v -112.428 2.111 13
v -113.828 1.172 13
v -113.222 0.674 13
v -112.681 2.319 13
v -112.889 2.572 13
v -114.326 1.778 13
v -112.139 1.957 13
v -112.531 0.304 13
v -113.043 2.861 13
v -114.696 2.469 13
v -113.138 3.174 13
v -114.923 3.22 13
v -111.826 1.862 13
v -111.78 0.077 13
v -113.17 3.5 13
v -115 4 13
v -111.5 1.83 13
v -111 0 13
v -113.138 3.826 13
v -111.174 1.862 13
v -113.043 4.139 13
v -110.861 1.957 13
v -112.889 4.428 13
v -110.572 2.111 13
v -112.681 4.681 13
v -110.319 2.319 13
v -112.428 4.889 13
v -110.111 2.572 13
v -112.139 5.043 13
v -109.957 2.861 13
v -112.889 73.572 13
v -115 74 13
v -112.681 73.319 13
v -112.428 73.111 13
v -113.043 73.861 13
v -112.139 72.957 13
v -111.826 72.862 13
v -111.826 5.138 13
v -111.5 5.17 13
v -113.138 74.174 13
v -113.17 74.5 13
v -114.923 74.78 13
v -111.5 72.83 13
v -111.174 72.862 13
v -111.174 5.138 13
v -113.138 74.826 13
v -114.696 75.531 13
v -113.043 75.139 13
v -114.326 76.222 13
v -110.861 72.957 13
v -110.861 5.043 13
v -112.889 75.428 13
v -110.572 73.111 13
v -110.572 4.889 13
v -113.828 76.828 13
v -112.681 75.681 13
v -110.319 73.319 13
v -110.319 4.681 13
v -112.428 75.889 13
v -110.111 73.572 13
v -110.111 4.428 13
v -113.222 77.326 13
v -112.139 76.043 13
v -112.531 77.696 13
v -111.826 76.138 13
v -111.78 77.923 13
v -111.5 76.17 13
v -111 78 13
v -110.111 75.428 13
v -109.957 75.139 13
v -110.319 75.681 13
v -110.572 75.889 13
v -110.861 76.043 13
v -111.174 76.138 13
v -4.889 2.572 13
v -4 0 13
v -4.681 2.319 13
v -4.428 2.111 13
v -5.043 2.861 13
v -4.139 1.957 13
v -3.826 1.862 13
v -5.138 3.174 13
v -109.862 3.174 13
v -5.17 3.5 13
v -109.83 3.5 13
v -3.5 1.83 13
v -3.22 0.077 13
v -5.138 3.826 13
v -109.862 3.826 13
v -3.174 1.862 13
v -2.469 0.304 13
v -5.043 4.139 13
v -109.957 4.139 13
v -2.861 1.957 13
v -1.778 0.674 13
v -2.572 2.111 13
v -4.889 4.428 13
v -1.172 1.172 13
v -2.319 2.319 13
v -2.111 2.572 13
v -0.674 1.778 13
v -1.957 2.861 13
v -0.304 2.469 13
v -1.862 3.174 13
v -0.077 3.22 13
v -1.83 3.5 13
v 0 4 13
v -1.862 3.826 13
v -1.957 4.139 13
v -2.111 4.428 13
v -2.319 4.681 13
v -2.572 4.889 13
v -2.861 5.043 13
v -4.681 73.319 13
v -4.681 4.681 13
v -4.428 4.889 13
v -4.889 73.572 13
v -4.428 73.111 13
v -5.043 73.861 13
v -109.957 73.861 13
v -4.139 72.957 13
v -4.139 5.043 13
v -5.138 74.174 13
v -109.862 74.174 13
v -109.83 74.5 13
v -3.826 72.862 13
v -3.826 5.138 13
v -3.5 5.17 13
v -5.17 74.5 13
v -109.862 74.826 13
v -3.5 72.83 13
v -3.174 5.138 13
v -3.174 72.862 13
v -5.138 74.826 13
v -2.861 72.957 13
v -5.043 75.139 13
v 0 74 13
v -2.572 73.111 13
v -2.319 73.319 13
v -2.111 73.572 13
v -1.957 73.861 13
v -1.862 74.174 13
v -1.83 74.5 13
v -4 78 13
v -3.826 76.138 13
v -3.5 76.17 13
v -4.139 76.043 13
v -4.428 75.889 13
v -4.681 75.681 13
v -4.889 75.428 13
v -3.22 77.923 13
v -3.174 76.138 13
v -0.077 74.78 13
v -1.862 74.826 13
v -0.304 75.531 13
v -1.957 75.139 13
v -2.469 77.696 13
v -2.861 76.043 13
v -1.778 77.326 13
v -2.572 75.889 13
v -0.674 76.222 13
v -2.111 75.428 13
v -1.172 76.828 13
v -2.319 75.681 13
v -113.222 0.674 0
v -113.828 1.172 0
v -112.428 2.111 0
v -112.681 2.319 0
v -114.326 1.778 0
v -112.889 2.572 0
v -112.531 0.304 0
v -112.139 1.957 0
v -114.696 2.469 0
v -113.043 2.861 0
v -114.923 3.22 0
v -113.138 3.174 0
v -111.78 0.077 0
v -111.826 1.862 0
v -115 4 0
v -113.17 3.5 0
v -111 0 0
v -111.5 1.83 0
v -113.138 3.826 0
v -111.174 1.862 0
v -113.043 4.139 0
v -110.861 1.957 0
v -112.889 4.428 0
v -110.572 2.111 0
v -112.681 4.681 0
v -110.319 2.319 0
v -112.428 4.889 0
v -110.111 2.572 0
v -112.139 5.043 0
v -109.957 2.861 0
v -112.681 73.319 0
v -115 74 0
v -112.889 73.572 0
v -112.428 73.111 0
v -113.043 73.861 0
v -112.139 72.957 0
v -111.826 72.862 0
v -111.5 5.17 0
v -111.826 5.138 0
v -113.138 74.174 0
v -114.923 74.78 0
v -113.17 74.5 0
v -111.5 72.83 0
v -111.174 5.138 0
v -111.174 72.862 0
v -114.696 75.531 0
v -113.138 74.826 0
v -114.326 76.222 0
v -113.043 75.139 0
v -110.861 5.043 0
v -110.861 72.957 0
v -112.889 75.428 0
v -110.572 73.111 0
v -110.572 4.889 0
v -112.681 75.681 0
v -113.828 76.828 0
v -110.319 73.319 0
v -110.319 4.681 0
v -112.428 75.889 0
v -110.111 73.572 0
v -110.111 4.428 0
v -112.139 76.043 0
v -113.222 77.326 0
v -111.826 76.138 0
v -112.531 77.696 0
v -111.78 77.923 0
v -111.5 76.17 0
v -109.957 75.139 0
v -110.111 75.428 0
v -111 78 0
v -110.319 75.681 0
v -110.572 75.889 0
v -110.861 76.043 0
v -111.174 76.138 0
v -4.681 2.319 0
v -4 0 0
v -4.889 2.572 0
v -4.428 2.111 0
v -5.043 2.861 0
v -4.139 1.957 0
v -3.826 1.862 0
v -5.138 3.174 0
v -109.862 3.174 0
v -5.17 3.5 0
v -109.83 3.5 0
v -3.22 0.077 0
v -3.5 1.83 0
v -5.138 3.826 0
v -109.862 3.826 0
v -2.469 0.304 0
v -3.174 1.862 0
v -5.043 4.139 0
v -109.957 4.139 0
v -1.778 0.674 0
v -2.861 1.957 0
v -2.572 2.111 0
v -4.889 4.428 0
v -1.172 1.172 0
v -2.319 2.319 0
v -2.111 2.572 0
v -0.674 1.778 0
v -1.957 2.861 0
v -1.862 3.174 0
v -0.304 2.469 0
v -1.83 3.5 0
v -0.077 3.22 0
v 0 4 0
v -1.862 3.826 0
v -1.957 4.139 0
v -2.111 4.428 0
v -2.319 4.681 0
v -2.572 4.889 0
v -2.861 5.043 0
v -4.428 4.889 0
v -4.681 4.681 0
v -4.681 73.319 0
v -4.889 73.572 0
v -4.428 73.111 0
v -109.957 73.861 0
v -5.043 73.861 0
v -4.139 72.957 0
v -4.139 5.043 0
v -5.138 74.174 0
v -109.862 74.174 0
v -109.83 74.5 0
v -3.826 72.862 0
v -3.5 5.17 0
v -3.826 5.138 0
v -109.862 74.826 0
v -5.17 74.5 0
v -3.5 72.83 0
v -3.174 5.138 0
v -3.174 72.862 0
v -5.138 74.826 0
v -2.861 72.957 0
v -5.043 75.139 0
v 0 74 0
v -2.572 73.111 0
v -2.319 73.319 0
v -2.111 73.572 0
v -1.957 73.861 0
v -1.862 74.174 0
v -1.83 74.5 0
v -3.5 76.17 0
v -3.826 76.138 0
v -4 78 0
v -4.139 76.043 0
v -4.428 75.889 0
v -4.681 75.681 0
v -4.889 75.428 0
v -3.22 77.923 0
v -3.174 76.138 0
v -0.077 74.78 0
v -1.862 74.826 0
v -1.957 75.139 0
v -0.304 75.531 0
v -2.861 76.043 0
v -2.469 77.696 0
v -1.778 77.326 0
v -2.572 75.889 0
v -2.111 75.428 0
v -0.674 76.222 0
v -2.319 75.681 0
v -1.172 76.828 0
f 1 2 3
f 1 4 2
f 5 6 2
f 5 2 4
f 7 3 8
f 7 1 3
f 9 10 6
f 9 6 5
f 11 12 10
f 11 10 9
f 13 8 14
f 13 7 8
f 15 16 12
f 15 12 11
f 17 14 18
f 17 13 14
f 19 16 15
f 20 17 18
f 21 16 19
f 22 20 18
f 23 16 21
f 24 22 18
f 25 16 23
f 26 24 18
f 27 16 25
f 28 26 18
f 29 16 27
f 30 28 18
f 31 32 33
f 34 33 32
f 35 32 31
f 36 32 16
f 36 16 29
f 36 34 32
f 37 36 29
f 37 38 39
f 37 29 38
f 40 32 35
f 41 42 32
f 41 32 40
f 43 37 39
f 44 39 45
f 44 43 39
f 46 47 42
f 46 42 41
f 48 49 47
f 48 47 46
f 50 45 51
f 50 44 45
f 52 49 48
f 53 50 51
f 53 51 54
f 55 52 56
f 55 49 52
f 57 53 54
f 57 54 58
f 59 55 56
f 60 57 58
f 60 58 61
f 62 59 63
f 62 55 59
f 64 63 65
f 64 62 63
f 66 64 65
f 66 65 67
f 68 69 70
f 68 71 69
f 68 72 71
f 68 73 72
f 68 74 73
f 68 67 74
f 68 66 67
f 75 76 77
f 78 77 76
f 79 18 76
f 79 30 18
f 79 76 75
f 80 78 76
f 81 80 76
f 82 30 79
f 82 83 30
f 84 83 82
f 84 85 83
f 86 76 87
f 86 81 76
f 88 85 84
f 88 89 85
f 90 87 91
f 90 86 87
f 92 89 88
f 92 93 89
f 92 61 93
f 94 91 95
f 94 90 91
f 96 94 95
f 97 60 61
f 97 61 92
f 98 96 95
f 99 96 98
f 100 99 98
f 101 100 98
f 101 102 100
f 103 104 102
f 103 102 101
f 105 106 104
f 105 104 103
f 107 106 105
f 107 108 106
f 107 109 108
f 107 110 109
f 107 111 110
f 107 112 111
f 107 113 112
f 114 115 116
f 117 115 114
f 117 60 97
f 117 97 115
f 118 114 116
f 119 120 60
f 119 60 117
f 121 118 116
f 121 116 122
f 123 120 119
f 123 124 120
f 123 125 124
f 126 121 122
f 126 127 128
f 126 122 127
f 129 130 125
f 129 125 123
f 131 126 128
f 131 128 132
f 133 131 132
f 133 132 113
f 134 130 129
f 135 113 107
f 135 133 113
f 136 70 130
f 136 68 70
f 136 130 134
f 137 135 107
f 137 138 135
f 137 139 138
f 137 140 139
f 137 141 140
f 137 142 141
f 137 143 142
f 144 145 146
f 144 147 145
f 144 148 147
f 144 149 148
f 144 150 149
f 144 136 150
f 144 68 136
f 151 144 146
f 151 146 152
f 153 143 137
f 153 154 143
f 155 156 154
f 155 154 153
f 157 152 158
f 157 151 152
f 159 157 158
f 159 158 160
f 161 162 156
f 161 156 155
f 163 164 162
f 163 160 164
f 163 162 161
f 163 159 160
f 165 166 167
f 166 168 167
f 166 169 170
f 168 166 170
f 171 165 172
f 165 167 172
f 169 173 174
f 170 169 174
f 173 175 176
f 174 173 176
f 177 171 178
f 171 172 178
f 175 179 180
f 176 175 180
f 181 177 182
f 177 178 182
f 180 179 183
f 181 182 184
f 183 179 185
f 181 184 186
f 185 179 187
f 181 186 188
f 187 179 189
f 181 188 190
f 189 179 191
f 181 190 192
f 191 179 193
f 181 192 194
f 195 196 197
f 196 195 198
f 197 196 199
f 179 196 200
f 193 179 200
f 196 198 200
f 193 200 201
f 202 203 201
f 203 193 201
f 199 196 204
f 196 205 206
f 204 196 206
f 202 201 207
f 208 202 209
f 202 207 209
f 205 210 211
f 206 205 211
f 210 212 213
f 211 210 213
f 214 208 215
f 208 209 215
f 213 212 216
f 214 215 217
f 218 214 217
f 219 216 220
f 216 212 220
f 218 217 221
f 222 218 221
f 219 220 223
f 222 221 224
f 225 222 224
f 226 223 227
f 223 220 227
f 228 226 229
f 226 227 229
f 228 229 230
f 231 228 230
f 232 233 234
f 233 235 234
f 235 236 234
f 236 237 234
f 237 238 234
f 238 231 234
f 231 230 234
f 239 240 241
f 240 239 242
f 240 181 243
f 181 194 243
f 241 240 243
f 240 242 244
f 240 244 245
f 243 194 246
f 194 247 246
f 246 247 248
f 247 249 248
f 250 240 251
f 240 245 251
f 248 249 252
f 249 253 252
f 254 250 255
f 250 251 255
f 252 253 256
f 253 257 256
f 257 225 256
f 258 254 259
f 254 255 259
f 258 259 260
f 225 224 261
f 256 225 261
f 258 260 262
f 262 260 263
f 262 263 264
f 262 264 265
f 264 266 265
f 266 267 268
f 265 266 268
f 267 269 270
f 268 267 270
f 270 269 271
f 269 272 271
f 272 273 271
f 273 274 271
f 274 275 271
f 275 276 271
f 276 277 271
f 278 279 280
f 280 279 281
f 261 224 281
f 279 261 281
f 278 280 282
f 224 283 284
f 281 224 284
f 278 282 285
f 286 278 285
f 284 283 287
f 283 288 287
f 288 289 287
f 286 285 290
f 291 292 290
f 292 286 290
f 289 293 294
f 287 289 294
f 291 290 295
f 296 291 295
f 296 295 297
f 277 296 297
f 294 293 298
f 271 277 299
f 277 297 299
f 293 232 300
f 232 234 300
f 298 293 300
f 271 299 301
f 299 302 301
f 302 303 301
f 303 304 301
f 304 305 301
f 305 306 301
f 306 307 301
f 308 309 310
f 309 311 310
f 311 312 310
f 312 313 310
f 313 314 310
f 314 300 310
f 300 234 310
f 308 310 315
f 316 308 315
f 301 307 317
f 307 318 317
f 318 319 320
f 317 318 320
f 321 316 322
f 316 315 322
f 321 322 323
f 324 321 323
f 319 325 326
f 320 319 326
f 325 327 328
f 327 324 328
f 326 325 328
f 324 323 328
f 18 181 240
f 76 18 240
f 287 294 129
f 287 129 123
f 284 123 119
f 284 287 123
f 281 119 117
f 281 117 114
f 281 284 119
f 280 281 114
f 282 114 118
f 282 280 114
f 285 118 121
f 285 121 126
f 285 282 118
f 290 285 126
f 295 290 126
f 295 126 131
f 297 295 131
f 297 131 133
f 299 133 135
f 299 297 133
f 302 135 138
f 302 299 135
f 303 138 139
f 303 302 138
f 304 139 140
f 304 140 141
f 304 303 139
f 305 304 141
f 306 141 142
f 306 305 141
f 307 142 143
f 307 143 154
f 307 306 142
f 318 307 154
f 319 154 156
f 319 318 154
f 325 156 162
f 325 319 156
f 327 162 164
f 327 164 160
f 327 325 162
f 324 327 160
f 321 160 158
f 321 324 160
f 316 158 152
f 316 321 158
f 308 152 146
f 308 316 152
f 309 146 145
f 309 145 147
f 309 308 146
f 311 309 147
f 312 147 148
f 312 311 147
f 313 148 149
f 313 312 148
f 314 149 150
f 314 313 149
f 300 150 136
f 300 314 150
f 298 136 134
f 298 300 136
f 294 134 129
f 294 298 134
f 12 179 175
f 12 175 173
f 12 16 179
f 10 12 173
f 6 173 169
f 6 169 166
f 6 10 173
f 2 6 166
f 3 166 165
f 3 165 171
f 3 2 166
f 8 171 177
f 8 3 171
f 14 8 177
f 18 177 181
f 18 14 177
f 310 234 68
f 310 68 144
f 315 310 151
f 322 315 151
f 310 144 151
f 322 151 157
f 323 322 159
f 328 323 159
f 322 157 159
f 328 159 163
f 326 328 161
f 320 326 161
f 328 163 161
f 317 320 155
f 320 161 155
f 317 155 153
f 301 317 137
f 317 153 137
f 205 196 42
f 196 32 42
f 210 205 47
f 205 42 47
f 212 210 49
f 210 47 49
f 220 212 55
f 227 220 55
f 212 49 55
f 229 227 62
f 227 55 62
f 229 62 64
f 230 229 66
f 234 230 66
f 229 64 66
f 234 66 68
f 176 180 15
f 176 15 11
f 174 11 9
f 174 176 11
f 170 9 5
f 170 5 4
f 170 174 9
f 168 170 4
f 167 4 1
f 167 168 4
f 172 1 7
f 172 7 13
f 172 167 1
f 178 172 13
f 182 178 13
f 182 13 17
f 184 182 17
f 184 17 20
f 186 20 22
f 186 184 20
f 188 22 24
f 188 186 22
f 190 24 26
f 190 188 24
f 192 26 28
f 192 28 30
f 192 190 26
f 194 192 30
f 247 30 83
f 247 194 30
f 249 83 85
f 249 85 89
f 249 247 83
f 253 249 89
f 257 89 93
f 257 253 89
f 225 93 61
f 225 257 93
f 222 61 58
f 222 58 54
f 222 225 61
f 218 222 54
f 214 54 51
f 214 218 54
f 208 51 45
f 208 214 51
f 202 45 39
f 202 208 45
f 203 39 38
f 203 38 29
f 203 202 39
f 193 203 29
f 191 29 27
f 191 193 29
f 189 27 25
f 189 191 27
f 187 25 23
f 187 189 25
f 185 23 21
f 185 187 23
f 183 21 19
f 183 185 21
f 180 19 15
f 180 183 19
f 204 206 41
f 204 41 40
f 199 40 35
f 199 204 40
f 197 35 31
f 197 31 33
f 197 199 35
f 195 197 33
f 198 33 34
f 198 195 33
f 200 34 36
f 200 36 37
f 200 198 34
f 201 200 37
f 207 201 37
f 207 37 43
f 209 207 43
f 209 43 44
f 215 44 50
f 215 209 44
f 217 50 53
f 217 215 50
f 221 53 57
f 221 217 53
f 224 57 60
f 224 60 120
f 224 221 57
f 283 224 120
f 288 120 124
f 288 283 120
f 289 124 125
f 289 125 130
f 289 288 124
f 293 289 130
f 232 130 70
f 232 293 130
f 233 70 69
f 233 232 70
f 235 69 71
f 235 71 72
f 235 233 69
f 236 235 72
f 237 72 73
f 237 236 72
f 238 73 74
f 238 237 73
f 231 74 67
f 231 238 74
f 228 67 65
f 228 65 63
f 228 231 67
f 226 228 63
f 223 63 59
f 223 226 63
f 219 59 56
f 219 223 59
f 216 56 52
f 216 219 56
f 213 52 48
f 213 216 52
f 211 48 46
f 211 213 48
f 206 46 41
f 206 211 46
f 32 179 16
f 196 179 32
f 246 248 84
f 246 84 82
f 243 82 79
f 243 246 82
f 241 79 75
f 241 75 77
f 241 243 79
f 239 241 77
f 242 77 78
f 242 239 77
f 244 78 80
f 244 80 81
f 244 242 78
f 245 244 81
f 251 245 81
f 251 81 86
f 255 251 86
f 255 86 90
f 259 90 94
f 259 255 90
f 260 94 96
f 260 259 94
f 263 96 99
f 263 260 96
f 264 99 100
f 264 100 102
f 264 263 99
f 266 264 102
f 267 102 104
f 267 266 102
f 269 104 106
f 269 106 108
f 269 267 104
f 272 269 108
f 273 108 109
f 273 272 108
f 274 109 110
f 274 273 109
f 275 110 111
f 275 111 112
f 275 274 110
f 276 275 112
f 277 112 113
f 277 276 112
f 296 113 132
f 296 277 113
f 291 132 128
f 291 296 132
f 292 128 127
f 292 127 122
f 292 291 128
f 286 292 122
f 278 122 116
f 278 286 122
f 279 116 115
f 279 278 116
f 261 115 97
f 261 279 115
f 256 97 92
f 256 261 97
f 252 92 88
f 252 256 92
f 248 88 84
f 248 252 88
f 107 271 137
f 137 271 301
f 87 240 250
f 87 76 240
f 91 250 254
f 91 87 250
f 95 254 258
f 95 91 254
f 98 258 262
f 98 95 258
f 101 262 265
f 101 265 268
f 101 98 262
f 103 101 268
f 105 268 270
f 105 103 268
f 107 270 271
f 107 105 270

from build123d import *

# Parameters (mm, degrees)
SKETCH1_W           = 115
SKETCH1_H           = 78
SKETCH1_R           = 1.67
BOSS_EXTRUDE1_DEPTH = 13
FILLET1_R           = 4


with BuildPart() as part:
    # Sketch1 → Boss-Extrude1 (new body)
    with BuildSketch(Plane.XY):
        with Locations((-57.5, 39)):
            Rectangle(SKETCH1_W, SKETCH1_H)
        with Locations(Location((-111.5, 74.5, 0), (0, 0, 180))):
            Circle(SKETCH1_R, mode=Mode.SUBTRACT)
        with Locations(Location((-3.5, 74.5, 0), (0, 0, 180))):
            Circle(SKETCH1_R, mode=Mode.SUBTRACT)
        with Locations(Location((-3.5, 3.5, 0), (0, 0, 180))):
            Circle(SKETCH1_R, mode=Mode.SUBTRACT)
        with Locations(Location((-111.5, 3.5, 0), (0, 0, 180))):
            Circle(SKETCH1_R, mode=Mode.SUBTRACT)
    extrude(amount=BOSS_EXTRUDE1_DEPTH)

    # Fillet1
    fillet1_edges = [part.edges().sort_by_distance(p)[0] for p in [
        (-115, 78, 6.5),
        (0, 78, 6.5),
        (0, 0, 6.5),
        (-115, 0, 6.5),
    ]]
    fillet(fillet1_edges, radius=FILLET1_R)


solid = part.part
